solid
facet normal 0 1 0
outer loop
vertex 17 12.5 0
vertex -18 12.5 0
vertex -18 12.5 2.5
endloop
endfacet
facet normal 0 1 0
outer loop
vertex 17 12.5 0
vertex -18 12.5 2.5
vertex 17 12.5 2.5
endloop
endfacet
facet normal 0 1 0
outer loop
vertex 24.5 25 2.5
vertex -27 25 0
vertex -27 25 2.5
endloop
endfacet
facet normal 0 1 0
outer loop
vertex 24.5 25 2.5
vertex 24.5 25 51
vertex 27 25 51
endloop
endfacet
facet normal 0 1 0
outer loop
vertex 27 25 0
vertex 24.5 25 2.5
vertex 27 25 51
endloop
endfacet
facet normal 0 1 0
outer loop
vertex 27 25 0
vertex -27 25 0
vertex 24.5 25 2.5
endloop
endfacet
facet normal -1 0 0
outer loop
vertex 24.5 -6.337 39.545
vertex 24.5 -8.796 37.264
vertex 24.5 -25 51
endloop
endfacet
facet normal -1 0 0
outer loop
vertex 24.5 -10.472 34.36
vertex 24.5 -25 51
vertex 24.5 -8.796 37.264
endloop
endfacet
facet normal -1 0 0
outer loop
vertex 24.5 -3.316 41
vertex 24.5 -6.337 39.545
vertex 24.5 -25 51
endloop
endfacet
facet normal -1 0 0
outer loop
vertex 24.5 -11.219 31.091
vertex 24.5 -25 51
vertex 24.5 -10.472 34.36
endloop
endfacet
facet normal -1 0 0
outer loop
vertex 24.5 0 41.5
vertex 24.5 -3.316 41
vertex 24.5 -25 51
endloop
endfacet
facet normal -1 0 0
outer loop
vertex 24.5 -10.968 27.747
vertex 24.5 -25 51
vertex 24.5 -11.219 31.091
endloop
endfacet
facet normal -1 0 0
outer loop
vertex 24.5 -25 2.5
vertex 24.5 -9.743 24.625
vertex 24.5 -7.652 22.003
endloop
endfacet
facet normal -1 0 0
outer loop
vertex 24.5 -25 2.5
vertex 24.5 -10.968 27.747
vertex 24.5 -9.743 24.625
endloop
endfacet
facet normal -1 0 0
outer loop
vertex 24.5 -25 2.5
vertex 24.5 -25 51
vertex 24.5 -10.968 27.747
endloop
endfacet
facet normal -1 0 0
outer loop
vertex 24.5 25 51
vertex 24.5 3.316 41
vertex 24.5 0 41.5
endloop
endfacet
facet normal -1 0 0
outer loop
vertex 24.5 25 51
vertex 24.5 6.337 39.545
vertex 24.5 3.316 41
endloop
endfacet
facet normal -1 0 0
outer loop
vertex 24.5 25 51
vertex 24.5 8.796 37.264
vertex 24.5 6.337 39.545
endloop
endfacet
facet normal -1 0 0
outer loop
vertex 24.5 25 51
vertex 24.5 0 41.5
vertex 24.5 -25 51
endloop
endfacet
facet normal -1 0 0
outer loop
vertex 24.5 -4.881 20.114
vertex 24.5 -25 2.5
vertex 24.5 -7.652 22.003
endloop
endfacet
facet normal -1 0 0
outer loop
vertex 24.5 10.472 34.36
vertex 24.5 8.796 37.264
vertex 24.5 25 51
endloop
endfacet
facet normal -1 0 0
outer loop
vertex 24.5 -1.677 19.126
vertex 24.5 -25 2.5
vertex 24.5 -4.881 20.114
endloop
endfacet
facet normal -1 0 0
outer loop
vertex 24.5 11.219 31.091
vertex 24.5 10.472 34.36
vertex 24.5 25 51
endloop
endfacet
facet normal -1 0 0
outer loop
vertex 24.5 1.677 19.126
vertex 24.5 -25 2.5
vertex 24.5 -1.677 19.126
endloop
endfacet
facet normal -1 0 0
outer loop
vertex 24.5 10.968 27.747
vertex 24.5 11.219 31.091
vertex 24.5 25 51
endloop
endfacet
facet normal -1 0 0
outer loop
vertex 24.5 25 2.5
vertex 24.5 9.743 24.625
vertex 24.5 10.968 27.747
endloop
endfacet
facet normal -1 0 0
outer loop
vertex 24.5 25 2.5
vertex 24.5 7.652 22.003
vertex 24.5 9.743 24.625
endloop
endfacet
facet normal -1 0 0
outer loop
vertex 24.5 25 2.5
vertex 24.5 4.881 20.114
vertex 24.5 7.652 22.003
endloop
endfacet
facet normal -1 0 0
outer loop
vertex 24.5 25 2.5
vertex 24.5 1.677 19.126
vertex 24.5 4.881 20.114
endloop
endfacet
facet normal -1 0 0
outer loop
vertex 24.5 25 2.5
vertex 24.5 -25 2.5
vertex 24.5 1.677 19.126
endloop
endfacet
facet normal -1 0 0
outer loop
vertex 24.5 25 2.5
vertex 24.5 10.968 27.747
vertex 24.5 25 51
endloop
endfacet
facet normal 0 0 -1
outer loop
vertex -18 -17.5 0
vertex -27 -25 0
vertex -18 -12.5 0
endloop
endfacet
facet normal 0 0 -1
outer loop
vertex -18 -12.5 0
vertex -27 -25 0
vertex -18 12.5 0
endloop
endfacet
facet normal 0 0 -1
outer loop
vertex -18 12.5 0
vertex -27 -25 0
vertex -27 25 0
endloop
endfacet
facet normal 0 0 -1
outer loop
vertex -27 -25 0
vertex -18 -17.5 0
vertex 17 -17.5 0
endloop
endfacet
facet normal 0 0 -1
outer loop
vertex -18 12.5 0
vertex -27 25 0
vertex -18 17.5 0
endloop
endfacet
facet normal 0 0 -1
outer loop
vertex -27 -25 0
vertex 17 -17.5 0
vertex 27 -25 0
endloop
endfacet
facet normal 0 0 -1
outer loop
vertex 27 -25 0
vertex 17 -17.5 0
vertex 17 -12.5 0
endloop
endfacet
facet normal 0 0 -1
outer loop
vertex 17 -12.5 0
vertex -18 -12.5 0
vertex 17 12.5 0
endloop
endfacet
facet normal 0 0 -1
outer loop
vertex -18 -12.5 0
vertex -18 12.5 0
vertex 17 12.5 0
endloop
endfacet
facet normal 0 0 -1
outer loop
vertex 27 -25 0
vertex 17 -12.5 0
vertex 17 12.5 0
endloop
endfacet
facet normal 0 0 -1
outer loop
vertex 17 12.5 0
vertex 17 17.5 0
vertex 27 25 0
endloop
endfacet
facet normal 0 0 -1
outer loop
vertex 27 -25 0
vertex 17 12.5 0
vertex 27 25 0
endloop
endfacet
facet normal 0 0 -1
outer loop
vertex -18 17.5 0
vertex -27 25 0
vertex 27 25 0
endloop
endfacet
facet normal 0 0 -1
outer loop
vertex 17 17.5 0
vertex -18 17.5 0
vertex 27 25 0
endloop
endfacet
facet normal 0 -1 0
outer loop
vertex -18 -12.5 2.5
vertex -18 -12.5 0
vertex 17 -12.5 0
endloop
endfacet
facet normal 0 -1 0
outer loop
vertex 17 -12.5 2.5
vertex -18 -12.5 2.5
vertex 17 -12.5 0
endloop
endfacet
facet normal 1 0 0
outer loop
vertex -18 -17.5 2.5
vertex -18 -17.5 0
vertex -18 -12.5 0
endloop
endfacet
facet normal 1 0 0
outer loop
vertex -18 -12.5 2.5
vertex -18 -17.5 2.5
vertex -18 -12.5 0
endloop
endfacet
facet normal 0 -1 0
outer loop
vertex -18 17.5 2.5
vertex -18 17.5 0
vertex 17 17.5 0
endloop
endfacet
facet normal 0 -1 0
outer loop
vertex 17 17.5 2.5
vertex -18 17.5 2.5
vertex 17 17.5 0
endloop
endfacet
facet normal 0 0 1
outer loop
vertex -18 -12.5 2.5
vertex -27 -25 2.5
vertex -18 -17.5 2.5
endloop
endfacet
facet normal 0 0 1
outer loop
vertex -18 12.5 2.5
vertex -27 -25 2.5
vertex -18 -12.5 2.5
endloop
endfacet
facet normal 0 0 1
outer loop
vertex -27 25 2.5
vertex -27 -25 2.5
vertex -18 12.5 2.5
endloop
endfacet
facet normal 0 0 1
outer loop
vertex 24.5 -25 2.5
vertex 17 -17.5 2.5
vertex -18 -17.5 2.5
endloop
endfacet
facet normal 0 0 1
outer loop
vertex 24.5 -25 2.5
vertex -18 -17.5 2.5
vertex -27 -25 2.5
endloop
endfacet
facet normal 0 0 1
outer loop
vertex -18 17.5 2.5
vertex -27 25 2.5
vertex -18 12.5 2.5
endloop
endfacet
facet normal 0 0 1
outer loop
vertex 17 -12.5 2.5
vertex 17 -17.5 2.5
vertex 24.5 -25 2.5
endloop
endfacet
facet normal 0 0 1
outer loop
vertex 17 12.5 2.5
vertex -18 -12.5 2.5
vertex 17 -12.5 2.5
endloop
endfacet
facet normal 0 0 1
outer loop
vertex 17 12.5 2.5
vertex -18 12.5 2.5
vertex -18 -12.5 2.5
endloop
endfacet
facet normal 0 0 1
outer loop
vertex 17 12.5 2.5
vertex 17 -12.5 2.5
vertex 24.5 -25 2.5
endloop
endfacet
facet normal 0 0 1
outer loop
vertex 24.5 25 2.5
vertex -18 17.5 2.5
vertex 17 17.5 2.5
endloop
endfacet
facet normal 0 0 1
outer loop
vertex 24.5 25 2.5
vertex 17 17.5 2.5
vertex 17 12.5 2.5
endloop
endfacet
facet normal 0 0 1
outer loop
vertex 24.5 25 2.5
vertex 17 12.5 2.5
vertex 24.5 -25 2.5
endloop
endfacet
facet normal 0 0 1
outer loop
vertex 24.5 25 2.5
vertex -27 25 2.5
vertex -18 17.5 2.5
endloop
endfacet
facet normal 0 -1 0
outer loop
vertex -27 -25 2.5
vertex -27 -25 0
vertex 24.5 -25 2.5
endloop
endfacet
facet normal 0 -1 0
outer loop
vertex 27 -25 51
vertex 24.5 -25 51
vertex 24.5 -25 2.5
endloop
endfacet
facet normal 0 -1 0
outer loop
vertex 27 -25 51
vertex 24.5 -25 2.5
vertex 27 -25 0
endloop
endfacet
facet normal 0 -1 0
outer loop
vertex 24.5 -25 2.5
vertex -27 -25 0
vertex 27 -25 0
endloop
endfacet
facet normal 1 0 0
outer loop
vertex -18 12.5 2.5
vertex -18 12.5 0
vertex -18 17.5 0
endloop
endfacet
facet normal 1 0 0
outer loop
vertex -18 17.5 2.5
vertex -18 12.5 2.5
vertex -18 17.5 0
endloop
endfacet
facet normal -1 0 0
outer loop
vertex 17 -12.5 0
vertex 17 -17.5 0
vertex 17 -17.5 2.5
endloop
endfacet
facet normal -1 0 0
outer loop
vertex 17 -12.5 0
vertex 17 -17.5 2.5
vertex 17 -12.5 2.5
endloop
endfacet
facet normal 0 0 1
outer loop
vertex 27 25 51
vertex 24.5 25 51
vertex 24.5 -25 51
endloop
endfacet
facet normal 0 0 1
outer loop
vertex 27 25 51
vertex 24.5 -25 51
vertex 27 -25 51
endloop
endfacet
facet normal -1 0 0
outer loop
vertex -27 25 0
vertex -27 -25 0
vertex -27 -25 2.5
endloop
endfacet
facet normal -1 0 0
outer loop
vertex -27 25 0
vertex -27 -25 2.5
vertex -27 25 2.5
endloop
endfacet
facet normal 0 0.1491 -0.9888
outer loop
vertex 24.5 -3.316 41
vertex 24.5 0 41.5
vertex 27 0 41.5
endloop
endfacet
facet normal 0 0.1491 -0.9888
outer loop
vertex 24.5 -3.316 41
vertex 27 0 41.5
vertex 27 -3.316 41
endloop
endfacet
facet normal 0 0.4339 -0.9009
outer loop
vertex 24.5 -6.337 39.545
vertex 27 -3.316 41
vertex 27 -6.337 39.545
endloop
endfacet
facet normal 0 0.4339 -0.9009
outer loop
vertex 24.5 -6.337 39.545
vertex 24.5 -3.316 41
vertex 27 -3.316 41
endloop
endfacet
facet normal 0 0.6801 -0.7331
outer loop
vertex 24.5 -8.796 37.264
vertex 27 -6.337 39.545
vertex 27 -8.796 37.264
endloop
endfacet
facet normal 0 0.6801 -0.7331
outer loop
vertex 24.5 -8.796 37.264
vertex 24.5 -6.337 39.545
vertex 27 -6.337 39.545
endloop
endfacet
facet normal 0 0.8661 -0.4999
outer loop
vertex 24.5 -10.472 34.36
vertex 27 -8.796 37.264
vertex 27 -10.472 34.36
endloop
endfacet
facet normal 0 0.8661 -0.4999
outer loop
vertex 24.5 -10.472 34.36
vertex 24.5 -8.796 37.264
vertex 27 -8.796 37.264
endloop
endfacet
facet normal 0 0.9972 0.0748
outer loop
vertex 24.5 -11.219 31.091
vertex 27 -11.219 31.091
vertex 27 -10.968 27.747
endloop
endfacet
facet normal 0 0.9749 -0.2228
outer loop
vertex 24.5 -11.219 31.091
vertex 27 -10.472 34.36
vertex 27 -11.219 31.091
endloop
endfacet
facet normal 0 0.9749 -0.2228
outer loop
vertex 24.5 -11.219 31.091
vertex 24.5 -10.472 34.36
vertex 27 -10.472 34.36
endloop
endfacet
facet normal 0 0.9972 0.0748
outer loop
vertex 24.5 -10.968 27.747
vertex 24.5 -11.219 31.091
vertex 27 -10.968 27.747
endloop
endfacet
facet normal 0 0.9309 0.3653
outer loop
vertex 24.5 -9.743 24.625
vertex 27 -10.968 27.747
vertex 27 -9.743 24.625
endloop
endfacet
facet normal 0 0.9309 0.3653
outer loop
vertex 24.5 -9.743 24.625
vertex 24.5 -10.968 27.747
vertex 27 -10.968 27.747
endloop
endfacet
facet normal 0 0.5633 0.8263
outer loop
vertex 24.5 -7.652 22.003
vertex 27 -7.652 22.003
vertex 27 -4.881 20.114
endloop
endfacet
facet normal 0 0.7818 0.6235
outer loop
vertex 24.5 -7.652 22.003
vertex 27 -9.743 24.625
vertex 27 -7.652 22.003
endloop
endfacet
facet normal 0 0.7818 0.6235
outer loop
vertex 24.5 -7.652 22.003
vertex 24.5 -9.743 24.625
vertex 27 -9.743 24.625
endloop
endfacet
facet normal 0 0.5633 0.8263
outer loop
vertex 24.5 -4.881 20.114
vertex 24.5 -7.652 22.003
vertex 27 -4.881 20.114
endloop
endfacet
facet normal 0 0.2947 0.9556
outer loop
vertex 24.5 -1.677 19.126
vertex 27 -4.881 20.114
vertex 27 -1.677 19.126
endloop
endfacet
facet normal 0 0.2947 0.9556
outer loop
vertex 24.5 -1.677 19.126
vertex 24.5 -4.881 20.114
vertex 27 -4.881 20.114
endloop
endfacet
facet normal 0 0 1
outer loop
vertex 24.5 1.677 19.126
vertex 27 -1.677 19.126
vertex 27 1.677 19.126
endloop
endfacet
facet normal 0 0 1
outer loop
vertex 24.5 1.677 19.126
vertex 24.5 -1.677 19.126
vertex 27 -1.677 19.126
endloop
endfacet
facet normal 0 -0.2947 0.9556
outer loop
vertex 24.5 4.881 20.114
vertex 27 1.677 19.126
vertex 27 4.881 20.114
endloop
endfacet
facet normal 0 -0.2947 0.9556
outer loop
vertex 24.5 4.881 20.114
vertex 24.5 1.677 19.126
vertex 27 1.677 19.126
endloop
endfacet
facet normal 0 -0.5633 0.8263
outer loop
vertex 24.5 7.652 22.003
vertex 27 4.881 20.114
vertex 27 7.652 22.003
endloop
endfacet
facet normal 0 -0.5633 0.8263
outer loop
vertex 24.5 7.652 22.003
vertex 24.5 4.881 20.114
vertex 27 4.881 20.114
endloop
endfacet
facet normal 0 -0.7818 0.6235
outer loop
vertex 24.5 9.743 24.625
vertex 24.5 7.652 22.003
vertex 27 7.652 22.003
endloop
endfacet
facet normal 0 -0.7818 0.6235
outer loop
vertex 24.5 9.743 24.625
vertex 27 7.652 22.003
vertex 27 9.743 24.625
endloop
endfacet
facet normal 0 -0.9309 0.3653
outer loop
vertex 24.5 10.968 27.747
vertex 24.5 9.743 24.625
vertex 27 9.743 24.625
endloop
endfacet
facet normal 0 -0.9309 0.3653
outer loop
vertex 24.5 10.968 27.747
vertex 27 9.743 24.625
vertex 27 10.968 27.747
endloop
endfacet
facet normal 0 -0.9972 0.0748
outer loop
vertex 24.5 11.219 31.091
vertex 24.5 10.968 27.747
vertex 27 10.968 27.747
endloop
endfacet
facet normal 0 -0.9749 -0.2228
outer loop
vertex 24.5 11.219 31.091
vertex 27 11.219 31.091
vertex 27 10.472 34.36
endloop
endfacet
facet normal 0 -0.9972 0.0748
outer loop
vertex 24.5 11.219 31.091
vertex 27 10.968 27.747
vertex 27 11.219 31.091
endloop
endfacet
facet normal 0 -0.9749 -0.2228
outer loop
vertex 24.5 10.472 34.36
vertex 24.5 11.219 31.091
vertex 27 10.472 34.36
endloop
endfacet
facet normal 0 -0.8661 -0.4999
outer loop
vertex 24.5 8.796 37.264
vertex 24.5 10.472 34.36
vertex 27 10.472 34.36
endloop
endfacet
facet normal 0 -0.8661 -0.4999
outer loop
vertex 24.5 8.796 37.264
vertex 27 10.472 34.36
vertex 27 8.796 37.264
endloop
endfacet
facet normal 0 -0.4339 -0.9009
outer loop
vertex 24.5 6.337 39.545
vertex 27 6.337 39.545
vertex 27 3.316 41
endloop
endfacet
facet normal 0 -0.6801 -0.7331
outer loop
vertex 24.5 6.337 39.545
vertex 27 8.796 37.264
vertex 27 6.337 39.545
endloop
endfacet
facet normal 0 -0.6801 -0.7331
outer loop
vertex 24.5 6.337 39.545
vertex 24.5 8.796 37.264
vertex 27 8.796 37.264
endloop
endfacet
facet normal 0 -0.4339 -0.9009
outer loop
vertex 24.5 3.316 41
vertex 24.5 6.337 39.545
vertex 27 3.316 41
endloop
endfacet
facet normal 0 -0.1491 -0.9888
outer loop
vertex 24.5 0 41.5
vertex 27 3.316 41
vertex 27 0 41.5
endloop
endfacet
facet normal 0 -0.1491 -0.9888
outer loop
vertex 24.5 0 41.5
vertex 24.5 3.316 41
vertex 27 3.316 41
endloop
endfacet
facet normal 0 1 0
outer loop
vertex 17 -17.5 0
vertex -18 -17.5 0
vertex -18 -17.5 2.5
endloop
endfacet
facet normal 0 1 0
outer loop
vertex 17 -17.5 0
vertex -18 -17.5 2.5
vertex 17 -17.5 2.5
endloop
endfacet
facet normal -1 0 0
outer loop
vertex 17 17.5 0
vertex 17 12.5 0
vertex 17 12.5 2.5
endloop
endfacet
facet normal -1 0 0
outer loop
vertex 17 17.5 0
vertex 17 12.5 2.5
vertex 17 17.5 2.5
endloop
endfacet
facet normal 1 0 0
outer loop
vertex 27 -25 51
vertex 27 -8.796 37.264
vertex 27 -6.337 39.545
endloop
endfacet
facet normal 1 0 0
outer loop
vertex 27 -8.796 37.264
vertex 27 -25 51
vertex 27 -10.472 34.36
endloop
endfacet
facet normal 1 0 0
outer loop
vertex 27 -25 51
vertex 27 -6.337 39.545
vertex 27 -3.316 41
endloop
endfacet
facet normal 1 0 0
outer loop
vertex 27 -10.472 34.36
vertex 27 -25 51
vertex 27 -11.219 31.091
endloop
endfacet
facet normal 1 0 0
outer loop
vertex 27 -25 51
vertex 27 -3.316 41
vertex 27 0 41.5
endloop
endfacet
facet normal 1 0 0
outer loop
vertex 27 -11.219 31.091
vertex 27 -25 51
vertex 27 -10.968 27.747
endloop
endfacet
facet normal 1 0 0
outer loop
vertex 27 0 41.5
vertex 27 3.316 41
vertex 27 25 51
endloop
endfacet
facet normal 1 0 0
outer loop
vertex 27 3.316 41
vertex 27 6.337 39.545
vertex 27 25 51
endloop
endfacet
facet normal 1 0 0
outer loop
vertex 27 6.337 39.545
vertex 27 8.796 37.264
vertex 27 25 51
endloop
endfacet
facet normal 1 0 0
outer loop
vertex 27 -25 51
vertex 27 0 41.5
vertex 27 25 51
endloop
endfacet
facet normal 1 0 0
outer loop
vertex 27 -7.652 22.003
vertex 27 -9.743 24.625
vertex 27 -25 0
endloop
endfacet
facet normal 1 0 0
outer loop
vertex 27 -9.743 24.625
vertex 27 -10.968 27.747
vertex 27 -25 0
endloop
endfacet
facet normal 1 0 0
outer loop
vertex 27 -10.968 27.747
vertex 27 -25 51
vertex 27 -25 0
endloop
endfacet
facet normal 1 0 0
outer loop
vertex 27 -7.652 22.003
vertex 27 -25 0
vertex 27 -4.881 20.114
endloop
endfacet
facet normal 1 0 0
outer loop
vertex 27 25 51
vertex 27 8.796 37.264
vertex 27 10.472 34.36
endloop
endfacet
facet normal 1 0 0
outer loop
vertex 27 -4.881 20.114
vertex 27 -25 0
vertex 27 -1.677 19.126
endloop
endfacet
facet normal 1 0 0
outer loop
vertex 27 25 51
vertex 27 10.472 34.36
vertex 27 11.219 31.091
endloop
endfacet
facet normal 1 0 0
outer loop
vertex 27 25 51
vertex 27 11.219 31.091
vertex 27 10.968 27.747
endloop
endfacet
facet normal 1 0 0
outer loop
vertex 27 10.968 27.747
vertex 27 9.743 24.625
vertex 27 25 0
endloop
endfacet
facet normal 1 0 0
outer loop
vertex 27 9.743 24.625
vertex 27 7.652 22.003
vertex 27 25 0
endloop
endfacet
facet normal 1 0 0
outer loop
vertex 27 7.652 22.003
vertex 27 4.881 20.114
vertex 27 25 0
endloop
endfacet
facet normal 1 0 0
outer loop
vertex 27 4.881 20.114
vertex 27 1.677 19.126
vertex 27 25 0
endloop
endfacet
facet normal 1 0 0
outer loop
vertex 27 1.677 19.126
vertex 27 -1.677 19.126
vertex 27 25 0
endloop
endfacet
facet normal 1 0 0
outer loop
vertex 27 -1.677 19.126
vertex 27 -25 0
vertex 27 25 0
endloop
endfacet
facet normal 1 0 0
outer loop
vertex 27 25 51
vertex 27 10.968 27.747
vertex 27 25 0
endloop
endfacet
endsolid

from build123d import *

# Parameters (mm, degrees)
SKETCH1_W           = 54
SKETCH1_H           = 50
BOSS_EXTRUDE1_DEPTH = 2.5
SKETCH2_W           = 2.5
SKETCH2_H           = 50
BOSS_EXTRUDE2_DEPTH = 51
SKETCH3_R           = 11.25
CUT_EXTRUDE1_DEPTH  = 51
SKETCH4_W           = 35
SKETCH4_H           = 5
CUT_EXTRUDE2_DEPTH  = 51


with BuildPart() as part:
    # Sketch1 → Boss-Extrude1 (new body)
    with BuildSketch(Plane.XY):
        Rectangle(SKETCH1_W, SKETCH1_H)
    extrude(amount=BOSS_EXTRUDE1_DEPTH)

    # Sketch2 → Boss-Extrude2 (add)
    with BuildSketch(Plane.XY):
        with Locations((25.75, 0)):
            Rectangle(SKETCH2_W, SKETCH2_H)
    extrude(amount=BOSS_EXTRUDE2_DEPTH)

    # Sketch3 → Cut-Extrude1 (cut)
    with BuildSketch(Plane(origin=(0, 0, 0), x_dir=(0, 0, -1), z_dir=(1, 0, 0))):
        with Locations(Location((-30.25, 0, 0), (0, 0, 180))):
            Circle(SKETCH3_R)
    extrude(amount=CUT_EXTRUDE1_DEPTH, mode=Mode.SUBTRACT)

    # Sketch4 → Cut-Extrude2 (cut)
    with BuildSketch(Plane.XY):
        with Locations((-0.5, 15)):
            Rectangle(SKETCH4_W, SKETCH4_H)
        with Locations((-0.5, -15)):
            Rectangle(SKETCH4_W, SKETCH4_H)
    extrude(amount=CUT_EXTRUDE2_DEPTH, mode=Mode.SUBTRACT)


solid = part.part
